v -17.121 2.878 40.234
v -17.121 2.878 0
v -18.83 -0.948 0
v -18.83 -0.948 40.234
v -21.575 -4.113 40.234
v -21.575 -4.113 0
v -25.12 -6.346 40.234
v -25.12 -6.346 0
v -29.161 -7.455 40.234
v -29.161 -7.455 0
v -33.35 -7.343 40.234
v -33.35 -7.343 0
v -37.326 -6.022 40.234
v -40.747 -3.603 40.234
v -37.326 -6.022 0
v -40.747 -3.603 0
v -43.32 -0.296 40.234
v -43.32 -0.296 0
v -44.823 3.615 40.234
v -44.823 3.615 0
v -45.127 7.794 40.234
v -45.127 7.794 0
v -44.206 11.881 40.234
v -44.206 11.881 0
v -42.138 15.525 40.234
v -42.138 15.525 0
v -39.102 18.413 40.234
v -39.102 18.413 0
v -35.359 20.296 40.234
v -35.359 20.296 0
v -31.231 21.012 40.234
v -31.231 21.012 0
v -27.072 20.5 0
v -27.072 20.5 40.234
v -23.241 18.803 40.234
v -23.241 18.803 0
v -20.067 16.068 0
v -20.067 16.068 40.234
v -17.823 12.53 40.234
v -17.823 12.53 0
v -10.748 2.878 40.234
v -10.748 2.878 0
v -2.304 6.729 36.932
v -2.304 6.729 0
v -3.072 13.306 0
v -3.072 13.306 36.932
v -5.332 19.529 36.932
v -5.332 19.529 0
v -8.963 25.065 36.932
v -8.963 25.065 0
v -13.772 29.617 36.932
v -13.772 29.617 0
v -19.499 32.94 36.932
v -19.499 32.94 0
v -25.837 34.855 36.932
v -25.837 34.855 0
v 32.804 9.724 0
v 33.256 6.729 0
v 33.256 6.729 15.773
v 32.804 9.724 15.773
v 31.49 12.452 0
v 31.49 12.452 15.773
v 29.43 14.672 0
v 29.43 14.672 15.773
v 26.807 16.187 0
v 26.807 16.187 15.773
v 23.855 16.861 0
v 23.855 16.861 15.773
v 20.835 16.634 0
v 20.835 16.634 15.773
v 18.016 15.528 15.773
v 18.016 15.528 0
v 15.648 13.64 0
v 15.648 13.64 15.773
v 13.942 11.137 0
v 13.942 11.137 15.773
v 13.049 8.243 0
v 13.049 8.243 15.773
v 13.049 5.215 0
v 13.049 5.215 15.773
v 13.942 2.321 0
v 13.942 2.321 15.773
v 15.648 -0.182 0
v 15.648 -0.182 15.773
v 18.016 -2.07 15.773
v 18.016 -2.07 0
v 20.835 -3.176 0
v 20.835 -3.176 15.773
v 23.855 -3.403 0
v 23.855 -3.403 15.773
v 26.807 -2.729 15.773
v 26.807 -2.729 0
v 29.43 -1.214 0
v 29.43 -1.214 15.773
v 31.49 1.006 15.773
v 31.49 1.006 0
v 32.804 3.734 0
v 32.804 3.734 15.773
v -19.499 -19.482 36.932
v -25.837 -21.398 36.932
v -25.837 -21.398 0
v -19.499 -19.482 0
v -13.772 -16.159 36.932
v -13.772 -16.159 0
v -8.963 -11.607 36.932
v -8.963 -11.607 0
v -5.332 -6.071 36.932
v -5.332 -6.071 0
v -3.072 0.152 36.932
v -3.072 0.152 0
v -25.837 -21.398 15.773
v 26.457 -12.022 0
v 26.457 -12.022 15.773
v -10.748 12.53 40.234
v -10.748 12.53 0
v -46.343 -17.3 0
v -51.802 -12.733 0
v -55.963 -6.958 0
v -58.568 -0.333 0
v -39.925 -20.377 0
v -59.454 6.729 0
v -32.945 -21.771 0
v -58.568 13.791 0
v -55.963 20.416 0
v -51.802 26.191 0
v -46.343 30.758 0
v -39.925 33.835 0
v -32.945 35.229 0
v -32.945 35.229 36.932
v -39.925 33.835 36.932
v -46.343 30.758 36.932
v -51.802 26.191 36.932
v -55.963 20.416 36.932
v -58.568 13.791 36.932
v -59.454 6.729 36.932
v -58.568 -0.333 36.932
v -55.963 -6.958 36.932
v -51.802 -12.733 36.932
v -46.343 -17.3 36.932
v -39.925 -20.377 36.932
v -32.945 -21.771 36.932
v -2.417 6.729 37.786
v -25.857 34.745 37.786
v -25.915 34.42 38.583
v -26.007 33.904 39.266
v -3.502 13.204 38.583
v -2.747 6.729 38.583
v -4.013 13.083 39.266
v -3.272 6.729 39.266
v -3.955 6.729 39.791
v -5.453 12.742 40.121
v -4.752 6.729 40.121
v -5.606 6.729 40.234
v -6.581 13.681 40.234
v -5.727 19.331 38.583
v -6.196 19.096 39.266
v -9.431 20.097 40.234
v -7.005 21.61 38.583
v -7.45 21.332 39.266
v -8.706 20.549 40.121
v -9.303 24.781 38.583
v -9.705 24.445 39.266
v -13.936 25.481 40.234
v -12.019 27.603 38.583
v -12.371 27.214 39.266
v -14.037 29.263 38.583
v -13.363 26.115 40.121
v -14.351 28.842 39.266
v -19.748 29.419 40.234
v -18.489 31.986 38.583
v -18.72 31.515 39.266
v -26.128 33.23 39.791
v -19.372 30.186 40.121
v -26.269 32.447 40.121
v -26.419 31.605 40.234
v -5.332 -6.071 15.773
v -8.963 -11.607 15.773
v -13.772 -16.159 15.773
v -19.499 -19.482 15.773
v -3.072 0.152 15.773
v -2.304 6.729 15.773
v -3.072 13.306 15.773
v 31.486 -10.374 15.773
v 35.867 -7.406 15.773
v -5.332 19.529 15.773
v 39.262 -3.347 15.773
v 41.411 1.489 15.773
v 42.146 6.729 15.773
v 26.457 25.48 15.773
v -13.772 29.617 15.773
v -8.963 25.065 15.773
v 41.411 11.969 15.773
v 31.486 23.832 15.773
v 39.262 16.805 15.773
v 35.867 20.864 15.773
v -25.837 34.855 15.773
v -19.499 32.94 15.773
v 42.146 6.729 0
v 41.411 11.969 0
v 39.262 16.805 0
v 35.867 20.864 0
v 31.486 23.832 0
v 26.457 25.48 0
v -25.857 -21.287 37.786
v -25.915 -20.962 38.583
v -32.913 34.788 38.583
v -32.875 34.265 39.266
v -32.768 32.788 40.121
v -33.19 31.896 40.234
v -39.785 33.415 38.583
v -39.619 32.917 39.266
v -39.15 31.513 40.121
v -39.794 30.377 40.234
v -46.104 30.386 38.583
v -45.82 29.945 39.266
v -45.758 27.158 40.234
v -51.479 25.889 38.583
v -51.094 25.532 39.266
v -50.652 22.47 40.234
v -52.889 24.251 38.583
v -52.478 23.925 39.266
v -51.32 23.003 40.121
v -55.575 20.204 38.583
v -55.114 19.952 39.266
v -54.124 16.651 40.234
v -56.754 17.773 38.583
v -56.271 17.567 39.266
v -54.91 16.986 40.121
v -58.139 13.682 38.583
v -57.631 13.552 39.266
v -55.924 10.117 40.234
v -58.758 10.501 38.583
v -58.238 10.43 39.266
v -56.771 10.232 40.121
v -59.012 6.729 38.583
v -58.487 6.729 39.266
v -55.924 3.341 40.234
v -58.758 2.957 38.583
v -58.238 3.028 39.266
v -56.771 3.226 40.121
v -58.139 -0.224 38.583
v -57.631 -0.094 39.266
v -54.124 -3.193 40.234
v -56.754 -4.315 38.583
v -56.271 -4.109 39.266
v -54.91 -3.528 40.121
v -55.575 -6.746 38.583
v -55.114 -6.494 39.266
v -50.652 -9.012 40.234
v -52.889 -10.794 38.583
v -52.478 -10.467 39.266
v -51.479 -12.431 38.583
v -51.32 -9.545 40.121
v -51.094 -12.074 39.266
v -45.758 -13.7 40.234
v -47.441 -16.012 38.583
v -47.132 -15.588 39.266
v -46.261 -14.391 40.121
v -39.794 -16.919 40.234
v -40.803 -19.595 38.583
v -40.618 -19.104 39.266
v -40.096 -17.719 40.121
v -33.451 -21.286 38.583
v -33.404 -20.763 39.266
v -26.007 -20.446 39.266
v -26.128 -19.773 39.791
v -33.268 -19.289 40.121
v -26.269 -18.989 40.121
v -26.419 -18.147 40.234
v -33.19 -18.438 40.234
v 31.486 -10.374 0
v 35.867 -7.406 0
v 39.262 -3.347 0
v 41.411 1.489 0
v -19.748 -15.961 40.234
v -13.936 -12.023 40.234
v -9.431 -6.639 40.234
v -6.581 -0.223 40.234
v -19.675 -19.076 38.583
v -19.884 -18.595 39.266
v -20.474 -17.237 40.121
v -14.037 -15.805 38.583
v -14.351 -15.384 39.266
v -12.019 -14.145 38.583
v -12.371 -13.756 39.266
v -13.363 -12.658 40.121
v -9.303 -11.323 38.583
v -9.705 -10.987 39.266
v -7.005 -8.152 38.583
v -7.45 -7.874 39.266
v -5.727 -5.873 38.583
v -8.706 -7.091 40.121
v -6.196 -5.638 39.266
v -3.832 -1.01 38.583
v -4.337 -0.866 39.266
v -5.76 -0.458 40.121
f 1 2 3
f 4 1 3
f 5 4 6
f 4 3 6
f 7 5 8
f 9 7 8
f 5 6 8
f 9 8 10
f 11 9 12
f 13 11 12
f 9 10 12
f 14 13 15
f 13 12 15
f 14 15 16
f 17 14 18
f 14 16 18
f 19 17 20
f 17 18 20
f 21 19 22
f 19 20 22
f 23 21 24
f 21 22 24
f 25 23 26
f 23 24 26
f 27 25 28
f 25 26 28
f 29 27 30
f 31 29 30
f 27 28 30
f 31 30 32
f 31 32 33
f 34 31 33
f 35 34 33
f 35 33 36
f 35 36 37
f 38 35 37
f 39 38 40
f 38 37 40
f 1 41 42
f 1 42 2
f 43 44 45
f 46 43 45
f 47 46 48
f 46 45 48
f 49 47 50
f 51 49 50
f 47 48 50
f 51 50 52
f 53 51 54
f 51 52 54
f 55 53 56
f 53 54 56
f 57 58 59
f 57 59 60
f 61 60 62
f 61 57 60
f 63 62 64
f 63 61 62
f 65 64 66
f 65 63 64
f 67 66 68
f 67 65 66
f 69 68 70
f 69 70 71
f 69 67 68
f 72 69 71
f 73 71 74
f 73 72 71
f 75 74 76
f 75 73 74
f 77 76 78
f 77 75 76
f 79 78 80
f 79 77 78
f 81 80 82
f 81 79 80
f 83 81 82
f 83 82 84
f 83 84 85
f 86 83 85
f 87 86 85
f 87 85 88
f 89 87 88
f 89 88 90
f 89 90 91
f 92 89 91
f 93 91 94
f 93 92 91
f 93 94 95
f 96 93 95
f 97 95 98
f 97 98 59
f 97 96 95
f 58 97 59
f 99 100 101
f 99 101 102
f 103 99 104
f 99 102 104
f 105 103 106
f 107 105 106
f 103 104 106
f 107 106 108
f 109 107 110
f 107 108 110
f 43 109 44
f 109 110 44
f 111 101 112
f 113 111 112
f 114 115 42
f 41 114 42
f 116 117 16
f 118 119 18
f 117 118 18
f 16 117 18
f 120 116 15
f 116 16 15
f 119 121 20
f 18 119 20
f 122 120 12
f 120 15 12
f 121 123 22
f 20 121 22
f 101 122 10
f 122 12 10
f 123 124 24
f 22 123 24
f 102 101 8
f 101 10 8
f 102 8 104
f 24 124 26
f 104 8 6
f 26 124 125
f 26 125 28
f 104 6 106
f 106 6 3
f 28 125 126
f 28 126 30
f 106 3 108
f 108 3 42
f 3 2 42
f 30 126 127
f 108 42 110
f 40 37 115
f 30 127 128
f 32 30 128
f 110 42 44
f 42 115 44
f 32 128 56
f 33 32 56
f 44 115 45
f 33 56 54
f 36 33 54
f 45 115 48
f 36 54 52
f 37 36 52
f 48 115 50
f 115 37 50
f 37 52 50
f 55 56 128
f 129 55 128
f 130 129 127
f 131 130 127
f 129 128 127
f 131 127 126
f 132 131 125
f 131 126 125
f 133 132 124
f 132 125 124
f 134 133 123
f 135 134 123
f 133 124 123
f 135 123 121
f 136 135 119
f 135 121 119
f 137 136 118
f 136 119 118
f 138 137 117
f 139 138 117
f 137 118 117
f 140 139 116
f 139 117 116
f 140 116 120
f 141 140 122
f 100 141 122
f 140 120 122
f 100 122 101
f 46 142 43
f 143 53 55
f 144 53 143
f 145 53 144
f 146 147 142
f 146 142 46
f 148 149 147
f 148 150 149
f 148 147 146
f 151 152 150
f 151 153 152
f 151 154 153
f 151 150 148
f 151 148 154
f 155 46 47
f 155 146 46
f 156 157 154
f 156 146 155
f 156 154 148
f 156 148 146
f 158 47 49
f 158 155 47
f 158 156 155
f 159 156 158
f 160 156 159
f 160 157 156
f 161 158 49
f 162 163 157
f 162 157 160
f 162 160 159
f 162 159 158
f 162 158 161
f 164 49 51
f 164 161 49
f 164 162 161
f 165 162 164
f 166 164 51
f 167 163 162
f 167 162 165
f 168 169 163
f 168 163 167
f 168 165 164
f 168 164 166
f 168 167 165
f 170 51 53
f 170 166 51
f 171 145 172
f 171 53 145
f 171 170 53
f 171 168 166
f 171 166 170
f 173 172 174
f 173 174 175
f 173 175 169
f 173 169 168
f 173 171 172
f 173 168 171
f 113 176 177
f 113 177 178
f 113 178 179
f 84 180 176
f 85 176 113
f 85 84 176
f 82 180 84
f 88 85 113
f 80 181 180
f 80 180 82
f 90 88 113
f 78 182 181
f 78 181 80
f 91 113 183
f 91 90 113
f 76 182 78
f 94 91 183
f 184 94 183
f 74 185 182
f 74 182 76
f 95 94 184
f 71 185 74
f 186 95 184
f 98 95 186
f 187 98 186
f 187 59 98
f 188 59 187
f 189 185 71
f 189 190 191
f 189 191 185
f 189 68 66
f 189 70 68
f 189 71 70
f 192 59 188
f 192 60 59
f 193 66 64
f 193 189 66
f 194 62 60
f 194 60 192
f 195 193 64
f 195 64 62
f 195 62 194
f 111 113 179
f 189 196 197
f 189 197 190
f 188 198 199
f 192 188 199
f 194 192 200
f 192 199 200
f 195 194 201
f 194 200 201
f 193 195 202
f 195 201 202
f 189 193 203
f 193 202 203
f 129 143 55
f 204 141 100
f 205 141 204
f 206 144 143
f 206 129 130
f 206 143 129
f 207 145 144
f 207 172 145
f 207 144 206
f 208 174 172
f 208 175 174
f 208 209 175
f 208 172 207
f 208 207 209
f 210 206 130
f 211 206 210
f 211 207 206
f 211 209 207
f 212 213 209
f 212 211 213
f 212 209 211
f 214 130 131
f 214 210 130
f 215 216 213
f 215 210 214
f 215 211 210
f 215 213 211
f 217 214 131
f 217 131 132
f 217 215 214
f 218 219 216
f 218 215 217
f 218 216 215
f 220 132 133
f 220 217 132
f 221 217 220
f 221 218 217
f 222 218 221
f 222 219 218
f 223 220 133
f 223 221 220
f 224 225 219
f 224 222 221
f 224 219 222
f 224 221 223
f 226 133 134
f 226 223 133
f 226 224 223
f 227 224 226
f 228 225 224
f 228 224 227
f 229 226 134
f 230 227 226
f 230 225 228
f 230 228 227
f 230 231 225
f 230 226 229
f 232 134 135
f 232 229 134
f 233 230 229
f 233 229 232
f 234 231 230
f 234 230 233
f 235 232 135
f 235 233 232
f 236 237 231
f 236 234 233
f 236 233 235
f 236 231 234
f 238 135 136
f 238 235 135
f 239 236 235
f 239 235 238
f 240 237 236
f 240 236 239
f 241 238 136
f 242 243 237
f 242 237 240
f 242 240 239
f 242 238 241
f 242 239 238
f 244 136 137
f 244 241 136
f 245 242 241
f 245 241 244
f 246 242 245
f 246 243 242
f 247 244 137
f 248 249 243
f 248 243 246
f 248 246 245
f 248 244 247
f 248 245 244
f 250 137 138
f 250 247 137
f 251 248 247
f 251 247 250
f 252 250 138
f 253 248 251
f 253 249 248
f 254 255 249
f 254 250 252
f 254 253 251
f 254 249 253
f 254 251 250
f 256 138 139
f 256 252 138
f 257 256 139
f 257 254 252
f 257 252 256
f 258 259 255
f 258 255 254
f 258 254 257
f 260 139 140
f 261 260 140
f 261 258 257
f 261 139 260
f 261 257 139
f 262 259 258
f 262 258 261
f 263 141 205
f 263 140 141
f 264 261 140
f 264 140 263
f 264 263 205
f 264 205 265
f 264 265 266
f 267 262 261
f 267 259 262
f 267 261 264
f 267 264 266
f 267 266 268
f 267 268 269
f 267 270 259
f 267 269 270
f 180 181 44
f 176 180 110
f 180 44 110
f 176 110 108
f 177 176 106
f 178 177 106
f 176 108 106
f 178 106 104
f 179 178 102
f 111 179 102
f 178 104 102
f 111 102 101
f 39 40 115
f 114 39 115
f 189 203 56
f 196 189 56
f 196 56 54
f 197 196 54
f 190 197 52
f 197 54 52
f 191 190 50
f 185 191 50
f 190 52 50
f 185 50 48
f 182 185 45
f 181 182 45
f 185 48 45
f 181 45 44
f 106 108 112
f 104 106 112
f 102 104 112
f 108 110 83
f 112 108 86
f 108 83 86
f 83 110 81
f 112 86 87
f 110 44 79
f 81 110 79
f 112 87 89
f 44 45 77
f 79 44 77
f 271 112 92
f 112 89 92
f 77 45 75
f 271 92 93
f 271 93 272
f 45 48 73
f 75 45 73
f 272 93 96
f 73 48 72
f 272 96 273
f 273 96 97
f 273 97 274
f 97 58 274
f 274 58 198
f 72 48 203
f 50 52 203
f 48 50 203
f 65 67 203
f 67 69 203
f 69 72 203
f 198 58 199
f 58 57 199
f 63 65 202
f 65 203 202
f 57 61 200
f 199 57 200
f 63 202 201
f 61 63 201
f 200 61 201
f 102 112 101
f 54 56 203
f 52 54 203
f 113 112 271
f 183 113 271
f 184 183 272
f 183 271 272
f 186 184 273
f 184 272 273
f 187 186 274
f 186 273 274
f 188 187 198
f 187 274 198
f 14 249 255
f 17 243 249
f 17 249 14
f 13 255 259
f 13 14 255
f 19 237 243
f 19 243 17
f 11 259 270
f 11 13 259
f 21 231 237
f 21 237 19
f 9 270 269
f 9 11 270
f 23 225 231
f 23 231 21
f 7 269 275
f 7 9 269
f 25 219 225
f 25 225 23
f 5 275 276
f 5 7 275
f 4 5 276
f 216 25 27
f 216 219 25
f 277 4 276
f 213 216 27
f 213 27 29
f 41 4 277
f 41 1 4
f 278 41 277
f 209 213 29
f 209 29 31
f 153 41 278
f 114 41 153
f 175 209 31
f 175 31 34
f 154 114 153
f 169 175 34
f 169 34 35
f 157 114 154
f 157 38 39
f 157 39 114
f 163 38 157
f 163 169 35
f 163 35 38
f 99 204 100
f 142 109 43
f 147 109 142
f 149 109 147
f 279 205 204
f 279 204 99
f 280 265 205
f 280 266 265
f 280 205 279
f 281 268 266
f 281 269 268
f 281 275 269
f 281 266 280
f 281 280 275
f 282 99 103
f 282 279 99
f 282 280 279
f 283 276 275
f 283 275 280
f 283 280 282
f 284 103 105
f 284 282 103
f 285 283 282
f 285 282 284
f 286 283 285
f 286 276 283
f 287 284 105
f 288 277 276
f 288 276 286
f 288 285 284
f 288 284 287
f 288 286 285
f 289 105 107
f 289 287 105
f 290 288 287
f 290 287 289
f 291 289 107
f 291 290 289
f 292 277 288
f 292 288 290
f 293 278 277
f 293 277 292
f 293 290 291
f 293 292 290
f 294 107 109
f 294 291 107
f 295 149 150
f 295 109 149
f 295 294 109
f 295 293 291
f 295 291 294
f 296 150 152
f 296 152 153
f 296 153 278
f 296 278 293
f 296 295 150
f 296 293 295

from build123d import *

# Parameters (mm, degrees)
F1_DEPTH = 40.2336
F0_R     = 10.16
F2_DEPTH = 15.7734
F3_R     = 3.302


with BuildPart() as f1:
    # F0 (on Top) → F1 (new body)
    with BuildSketch(Plane.XY):
        with BuildLine():
            ThreePointArc((-25.836789, -21.39759), (-8.963412, -11.60731), (-2.304436, 6.728951))
            ThreePointArc((-2.304436, 6.728951), (-8.963412, 25.065213), (-25.836789, 34.855493))
            ThreePointArc((-25.836789, 34.855493), (-59.454436, 6.728951), (-25.836789, -21.39759))
        make_face()
        with BuildLine():
            ThreePointArc((-17.120772, 2.877743), (-45.129325, 5.692937), (-17.822504, 12.529743))
            Line((-17.822504, 12.529743), (-10.74808, 12.529743))
            Line((-10.74808, 12.529743), (-10.74808, 2.877743))
            Line((-10.74808, 2.877743), (-17.120772, 2.877743))
        make_face(mode=Mode.SUBTRACT)
    extrude(amount=F1_DEPTH)

    # F3
    f3_edges = [f1.edges().sort_by_distance(p)[0] for p in [
        (-35.922083, 34.855493, 40.2336),
    ]]
    fillet(f3_edges, radius=F3_R)


with BuildPart() as f2:
    # F0 (on Top) → F2 (new body)
    with BuildSketch(Plane.XY):
        with BuildLine():
            ThreePointArc((-25.836789, 34.855493), (-8.963412, 25.065213), (-2.304436, 6.728951))
            ThreePointArc((-2.304436, 6.728951), (-8.963412, -11.60731), (-25.836789, -21.39759))
            Line((-25.836789, -21.39759), (26.457329, -12.022076))
            ThreePointArc((26.457329, -12.022076), (4.045564, 6.728951), (26.457329, 25.479979))
            Line((26.457329, 25.479979), (-25.836789, 34.855493))
        make_face()
        with BuildLine():
            ThreePointArc((42.145564, 6.728951), (37.706247, 18.953126), (26.457329, 25.479979))
            ThreePointArc((26.457329, 25.479979), (4.045564, 6.728951), (26.457329, -12.022076))
            ThreePointArc((26.457329, -12.022076), (37.706247, -5.495223), (42.145564, 6.728951))
        make_face()
        with Locations((23.095564, 6.728951)):
            Circle(F0_R, mode=Mode.SUBTRACT)
    extrude(amount=F2_DEPTH)


solid = Compound([f1.part, f2.part])
